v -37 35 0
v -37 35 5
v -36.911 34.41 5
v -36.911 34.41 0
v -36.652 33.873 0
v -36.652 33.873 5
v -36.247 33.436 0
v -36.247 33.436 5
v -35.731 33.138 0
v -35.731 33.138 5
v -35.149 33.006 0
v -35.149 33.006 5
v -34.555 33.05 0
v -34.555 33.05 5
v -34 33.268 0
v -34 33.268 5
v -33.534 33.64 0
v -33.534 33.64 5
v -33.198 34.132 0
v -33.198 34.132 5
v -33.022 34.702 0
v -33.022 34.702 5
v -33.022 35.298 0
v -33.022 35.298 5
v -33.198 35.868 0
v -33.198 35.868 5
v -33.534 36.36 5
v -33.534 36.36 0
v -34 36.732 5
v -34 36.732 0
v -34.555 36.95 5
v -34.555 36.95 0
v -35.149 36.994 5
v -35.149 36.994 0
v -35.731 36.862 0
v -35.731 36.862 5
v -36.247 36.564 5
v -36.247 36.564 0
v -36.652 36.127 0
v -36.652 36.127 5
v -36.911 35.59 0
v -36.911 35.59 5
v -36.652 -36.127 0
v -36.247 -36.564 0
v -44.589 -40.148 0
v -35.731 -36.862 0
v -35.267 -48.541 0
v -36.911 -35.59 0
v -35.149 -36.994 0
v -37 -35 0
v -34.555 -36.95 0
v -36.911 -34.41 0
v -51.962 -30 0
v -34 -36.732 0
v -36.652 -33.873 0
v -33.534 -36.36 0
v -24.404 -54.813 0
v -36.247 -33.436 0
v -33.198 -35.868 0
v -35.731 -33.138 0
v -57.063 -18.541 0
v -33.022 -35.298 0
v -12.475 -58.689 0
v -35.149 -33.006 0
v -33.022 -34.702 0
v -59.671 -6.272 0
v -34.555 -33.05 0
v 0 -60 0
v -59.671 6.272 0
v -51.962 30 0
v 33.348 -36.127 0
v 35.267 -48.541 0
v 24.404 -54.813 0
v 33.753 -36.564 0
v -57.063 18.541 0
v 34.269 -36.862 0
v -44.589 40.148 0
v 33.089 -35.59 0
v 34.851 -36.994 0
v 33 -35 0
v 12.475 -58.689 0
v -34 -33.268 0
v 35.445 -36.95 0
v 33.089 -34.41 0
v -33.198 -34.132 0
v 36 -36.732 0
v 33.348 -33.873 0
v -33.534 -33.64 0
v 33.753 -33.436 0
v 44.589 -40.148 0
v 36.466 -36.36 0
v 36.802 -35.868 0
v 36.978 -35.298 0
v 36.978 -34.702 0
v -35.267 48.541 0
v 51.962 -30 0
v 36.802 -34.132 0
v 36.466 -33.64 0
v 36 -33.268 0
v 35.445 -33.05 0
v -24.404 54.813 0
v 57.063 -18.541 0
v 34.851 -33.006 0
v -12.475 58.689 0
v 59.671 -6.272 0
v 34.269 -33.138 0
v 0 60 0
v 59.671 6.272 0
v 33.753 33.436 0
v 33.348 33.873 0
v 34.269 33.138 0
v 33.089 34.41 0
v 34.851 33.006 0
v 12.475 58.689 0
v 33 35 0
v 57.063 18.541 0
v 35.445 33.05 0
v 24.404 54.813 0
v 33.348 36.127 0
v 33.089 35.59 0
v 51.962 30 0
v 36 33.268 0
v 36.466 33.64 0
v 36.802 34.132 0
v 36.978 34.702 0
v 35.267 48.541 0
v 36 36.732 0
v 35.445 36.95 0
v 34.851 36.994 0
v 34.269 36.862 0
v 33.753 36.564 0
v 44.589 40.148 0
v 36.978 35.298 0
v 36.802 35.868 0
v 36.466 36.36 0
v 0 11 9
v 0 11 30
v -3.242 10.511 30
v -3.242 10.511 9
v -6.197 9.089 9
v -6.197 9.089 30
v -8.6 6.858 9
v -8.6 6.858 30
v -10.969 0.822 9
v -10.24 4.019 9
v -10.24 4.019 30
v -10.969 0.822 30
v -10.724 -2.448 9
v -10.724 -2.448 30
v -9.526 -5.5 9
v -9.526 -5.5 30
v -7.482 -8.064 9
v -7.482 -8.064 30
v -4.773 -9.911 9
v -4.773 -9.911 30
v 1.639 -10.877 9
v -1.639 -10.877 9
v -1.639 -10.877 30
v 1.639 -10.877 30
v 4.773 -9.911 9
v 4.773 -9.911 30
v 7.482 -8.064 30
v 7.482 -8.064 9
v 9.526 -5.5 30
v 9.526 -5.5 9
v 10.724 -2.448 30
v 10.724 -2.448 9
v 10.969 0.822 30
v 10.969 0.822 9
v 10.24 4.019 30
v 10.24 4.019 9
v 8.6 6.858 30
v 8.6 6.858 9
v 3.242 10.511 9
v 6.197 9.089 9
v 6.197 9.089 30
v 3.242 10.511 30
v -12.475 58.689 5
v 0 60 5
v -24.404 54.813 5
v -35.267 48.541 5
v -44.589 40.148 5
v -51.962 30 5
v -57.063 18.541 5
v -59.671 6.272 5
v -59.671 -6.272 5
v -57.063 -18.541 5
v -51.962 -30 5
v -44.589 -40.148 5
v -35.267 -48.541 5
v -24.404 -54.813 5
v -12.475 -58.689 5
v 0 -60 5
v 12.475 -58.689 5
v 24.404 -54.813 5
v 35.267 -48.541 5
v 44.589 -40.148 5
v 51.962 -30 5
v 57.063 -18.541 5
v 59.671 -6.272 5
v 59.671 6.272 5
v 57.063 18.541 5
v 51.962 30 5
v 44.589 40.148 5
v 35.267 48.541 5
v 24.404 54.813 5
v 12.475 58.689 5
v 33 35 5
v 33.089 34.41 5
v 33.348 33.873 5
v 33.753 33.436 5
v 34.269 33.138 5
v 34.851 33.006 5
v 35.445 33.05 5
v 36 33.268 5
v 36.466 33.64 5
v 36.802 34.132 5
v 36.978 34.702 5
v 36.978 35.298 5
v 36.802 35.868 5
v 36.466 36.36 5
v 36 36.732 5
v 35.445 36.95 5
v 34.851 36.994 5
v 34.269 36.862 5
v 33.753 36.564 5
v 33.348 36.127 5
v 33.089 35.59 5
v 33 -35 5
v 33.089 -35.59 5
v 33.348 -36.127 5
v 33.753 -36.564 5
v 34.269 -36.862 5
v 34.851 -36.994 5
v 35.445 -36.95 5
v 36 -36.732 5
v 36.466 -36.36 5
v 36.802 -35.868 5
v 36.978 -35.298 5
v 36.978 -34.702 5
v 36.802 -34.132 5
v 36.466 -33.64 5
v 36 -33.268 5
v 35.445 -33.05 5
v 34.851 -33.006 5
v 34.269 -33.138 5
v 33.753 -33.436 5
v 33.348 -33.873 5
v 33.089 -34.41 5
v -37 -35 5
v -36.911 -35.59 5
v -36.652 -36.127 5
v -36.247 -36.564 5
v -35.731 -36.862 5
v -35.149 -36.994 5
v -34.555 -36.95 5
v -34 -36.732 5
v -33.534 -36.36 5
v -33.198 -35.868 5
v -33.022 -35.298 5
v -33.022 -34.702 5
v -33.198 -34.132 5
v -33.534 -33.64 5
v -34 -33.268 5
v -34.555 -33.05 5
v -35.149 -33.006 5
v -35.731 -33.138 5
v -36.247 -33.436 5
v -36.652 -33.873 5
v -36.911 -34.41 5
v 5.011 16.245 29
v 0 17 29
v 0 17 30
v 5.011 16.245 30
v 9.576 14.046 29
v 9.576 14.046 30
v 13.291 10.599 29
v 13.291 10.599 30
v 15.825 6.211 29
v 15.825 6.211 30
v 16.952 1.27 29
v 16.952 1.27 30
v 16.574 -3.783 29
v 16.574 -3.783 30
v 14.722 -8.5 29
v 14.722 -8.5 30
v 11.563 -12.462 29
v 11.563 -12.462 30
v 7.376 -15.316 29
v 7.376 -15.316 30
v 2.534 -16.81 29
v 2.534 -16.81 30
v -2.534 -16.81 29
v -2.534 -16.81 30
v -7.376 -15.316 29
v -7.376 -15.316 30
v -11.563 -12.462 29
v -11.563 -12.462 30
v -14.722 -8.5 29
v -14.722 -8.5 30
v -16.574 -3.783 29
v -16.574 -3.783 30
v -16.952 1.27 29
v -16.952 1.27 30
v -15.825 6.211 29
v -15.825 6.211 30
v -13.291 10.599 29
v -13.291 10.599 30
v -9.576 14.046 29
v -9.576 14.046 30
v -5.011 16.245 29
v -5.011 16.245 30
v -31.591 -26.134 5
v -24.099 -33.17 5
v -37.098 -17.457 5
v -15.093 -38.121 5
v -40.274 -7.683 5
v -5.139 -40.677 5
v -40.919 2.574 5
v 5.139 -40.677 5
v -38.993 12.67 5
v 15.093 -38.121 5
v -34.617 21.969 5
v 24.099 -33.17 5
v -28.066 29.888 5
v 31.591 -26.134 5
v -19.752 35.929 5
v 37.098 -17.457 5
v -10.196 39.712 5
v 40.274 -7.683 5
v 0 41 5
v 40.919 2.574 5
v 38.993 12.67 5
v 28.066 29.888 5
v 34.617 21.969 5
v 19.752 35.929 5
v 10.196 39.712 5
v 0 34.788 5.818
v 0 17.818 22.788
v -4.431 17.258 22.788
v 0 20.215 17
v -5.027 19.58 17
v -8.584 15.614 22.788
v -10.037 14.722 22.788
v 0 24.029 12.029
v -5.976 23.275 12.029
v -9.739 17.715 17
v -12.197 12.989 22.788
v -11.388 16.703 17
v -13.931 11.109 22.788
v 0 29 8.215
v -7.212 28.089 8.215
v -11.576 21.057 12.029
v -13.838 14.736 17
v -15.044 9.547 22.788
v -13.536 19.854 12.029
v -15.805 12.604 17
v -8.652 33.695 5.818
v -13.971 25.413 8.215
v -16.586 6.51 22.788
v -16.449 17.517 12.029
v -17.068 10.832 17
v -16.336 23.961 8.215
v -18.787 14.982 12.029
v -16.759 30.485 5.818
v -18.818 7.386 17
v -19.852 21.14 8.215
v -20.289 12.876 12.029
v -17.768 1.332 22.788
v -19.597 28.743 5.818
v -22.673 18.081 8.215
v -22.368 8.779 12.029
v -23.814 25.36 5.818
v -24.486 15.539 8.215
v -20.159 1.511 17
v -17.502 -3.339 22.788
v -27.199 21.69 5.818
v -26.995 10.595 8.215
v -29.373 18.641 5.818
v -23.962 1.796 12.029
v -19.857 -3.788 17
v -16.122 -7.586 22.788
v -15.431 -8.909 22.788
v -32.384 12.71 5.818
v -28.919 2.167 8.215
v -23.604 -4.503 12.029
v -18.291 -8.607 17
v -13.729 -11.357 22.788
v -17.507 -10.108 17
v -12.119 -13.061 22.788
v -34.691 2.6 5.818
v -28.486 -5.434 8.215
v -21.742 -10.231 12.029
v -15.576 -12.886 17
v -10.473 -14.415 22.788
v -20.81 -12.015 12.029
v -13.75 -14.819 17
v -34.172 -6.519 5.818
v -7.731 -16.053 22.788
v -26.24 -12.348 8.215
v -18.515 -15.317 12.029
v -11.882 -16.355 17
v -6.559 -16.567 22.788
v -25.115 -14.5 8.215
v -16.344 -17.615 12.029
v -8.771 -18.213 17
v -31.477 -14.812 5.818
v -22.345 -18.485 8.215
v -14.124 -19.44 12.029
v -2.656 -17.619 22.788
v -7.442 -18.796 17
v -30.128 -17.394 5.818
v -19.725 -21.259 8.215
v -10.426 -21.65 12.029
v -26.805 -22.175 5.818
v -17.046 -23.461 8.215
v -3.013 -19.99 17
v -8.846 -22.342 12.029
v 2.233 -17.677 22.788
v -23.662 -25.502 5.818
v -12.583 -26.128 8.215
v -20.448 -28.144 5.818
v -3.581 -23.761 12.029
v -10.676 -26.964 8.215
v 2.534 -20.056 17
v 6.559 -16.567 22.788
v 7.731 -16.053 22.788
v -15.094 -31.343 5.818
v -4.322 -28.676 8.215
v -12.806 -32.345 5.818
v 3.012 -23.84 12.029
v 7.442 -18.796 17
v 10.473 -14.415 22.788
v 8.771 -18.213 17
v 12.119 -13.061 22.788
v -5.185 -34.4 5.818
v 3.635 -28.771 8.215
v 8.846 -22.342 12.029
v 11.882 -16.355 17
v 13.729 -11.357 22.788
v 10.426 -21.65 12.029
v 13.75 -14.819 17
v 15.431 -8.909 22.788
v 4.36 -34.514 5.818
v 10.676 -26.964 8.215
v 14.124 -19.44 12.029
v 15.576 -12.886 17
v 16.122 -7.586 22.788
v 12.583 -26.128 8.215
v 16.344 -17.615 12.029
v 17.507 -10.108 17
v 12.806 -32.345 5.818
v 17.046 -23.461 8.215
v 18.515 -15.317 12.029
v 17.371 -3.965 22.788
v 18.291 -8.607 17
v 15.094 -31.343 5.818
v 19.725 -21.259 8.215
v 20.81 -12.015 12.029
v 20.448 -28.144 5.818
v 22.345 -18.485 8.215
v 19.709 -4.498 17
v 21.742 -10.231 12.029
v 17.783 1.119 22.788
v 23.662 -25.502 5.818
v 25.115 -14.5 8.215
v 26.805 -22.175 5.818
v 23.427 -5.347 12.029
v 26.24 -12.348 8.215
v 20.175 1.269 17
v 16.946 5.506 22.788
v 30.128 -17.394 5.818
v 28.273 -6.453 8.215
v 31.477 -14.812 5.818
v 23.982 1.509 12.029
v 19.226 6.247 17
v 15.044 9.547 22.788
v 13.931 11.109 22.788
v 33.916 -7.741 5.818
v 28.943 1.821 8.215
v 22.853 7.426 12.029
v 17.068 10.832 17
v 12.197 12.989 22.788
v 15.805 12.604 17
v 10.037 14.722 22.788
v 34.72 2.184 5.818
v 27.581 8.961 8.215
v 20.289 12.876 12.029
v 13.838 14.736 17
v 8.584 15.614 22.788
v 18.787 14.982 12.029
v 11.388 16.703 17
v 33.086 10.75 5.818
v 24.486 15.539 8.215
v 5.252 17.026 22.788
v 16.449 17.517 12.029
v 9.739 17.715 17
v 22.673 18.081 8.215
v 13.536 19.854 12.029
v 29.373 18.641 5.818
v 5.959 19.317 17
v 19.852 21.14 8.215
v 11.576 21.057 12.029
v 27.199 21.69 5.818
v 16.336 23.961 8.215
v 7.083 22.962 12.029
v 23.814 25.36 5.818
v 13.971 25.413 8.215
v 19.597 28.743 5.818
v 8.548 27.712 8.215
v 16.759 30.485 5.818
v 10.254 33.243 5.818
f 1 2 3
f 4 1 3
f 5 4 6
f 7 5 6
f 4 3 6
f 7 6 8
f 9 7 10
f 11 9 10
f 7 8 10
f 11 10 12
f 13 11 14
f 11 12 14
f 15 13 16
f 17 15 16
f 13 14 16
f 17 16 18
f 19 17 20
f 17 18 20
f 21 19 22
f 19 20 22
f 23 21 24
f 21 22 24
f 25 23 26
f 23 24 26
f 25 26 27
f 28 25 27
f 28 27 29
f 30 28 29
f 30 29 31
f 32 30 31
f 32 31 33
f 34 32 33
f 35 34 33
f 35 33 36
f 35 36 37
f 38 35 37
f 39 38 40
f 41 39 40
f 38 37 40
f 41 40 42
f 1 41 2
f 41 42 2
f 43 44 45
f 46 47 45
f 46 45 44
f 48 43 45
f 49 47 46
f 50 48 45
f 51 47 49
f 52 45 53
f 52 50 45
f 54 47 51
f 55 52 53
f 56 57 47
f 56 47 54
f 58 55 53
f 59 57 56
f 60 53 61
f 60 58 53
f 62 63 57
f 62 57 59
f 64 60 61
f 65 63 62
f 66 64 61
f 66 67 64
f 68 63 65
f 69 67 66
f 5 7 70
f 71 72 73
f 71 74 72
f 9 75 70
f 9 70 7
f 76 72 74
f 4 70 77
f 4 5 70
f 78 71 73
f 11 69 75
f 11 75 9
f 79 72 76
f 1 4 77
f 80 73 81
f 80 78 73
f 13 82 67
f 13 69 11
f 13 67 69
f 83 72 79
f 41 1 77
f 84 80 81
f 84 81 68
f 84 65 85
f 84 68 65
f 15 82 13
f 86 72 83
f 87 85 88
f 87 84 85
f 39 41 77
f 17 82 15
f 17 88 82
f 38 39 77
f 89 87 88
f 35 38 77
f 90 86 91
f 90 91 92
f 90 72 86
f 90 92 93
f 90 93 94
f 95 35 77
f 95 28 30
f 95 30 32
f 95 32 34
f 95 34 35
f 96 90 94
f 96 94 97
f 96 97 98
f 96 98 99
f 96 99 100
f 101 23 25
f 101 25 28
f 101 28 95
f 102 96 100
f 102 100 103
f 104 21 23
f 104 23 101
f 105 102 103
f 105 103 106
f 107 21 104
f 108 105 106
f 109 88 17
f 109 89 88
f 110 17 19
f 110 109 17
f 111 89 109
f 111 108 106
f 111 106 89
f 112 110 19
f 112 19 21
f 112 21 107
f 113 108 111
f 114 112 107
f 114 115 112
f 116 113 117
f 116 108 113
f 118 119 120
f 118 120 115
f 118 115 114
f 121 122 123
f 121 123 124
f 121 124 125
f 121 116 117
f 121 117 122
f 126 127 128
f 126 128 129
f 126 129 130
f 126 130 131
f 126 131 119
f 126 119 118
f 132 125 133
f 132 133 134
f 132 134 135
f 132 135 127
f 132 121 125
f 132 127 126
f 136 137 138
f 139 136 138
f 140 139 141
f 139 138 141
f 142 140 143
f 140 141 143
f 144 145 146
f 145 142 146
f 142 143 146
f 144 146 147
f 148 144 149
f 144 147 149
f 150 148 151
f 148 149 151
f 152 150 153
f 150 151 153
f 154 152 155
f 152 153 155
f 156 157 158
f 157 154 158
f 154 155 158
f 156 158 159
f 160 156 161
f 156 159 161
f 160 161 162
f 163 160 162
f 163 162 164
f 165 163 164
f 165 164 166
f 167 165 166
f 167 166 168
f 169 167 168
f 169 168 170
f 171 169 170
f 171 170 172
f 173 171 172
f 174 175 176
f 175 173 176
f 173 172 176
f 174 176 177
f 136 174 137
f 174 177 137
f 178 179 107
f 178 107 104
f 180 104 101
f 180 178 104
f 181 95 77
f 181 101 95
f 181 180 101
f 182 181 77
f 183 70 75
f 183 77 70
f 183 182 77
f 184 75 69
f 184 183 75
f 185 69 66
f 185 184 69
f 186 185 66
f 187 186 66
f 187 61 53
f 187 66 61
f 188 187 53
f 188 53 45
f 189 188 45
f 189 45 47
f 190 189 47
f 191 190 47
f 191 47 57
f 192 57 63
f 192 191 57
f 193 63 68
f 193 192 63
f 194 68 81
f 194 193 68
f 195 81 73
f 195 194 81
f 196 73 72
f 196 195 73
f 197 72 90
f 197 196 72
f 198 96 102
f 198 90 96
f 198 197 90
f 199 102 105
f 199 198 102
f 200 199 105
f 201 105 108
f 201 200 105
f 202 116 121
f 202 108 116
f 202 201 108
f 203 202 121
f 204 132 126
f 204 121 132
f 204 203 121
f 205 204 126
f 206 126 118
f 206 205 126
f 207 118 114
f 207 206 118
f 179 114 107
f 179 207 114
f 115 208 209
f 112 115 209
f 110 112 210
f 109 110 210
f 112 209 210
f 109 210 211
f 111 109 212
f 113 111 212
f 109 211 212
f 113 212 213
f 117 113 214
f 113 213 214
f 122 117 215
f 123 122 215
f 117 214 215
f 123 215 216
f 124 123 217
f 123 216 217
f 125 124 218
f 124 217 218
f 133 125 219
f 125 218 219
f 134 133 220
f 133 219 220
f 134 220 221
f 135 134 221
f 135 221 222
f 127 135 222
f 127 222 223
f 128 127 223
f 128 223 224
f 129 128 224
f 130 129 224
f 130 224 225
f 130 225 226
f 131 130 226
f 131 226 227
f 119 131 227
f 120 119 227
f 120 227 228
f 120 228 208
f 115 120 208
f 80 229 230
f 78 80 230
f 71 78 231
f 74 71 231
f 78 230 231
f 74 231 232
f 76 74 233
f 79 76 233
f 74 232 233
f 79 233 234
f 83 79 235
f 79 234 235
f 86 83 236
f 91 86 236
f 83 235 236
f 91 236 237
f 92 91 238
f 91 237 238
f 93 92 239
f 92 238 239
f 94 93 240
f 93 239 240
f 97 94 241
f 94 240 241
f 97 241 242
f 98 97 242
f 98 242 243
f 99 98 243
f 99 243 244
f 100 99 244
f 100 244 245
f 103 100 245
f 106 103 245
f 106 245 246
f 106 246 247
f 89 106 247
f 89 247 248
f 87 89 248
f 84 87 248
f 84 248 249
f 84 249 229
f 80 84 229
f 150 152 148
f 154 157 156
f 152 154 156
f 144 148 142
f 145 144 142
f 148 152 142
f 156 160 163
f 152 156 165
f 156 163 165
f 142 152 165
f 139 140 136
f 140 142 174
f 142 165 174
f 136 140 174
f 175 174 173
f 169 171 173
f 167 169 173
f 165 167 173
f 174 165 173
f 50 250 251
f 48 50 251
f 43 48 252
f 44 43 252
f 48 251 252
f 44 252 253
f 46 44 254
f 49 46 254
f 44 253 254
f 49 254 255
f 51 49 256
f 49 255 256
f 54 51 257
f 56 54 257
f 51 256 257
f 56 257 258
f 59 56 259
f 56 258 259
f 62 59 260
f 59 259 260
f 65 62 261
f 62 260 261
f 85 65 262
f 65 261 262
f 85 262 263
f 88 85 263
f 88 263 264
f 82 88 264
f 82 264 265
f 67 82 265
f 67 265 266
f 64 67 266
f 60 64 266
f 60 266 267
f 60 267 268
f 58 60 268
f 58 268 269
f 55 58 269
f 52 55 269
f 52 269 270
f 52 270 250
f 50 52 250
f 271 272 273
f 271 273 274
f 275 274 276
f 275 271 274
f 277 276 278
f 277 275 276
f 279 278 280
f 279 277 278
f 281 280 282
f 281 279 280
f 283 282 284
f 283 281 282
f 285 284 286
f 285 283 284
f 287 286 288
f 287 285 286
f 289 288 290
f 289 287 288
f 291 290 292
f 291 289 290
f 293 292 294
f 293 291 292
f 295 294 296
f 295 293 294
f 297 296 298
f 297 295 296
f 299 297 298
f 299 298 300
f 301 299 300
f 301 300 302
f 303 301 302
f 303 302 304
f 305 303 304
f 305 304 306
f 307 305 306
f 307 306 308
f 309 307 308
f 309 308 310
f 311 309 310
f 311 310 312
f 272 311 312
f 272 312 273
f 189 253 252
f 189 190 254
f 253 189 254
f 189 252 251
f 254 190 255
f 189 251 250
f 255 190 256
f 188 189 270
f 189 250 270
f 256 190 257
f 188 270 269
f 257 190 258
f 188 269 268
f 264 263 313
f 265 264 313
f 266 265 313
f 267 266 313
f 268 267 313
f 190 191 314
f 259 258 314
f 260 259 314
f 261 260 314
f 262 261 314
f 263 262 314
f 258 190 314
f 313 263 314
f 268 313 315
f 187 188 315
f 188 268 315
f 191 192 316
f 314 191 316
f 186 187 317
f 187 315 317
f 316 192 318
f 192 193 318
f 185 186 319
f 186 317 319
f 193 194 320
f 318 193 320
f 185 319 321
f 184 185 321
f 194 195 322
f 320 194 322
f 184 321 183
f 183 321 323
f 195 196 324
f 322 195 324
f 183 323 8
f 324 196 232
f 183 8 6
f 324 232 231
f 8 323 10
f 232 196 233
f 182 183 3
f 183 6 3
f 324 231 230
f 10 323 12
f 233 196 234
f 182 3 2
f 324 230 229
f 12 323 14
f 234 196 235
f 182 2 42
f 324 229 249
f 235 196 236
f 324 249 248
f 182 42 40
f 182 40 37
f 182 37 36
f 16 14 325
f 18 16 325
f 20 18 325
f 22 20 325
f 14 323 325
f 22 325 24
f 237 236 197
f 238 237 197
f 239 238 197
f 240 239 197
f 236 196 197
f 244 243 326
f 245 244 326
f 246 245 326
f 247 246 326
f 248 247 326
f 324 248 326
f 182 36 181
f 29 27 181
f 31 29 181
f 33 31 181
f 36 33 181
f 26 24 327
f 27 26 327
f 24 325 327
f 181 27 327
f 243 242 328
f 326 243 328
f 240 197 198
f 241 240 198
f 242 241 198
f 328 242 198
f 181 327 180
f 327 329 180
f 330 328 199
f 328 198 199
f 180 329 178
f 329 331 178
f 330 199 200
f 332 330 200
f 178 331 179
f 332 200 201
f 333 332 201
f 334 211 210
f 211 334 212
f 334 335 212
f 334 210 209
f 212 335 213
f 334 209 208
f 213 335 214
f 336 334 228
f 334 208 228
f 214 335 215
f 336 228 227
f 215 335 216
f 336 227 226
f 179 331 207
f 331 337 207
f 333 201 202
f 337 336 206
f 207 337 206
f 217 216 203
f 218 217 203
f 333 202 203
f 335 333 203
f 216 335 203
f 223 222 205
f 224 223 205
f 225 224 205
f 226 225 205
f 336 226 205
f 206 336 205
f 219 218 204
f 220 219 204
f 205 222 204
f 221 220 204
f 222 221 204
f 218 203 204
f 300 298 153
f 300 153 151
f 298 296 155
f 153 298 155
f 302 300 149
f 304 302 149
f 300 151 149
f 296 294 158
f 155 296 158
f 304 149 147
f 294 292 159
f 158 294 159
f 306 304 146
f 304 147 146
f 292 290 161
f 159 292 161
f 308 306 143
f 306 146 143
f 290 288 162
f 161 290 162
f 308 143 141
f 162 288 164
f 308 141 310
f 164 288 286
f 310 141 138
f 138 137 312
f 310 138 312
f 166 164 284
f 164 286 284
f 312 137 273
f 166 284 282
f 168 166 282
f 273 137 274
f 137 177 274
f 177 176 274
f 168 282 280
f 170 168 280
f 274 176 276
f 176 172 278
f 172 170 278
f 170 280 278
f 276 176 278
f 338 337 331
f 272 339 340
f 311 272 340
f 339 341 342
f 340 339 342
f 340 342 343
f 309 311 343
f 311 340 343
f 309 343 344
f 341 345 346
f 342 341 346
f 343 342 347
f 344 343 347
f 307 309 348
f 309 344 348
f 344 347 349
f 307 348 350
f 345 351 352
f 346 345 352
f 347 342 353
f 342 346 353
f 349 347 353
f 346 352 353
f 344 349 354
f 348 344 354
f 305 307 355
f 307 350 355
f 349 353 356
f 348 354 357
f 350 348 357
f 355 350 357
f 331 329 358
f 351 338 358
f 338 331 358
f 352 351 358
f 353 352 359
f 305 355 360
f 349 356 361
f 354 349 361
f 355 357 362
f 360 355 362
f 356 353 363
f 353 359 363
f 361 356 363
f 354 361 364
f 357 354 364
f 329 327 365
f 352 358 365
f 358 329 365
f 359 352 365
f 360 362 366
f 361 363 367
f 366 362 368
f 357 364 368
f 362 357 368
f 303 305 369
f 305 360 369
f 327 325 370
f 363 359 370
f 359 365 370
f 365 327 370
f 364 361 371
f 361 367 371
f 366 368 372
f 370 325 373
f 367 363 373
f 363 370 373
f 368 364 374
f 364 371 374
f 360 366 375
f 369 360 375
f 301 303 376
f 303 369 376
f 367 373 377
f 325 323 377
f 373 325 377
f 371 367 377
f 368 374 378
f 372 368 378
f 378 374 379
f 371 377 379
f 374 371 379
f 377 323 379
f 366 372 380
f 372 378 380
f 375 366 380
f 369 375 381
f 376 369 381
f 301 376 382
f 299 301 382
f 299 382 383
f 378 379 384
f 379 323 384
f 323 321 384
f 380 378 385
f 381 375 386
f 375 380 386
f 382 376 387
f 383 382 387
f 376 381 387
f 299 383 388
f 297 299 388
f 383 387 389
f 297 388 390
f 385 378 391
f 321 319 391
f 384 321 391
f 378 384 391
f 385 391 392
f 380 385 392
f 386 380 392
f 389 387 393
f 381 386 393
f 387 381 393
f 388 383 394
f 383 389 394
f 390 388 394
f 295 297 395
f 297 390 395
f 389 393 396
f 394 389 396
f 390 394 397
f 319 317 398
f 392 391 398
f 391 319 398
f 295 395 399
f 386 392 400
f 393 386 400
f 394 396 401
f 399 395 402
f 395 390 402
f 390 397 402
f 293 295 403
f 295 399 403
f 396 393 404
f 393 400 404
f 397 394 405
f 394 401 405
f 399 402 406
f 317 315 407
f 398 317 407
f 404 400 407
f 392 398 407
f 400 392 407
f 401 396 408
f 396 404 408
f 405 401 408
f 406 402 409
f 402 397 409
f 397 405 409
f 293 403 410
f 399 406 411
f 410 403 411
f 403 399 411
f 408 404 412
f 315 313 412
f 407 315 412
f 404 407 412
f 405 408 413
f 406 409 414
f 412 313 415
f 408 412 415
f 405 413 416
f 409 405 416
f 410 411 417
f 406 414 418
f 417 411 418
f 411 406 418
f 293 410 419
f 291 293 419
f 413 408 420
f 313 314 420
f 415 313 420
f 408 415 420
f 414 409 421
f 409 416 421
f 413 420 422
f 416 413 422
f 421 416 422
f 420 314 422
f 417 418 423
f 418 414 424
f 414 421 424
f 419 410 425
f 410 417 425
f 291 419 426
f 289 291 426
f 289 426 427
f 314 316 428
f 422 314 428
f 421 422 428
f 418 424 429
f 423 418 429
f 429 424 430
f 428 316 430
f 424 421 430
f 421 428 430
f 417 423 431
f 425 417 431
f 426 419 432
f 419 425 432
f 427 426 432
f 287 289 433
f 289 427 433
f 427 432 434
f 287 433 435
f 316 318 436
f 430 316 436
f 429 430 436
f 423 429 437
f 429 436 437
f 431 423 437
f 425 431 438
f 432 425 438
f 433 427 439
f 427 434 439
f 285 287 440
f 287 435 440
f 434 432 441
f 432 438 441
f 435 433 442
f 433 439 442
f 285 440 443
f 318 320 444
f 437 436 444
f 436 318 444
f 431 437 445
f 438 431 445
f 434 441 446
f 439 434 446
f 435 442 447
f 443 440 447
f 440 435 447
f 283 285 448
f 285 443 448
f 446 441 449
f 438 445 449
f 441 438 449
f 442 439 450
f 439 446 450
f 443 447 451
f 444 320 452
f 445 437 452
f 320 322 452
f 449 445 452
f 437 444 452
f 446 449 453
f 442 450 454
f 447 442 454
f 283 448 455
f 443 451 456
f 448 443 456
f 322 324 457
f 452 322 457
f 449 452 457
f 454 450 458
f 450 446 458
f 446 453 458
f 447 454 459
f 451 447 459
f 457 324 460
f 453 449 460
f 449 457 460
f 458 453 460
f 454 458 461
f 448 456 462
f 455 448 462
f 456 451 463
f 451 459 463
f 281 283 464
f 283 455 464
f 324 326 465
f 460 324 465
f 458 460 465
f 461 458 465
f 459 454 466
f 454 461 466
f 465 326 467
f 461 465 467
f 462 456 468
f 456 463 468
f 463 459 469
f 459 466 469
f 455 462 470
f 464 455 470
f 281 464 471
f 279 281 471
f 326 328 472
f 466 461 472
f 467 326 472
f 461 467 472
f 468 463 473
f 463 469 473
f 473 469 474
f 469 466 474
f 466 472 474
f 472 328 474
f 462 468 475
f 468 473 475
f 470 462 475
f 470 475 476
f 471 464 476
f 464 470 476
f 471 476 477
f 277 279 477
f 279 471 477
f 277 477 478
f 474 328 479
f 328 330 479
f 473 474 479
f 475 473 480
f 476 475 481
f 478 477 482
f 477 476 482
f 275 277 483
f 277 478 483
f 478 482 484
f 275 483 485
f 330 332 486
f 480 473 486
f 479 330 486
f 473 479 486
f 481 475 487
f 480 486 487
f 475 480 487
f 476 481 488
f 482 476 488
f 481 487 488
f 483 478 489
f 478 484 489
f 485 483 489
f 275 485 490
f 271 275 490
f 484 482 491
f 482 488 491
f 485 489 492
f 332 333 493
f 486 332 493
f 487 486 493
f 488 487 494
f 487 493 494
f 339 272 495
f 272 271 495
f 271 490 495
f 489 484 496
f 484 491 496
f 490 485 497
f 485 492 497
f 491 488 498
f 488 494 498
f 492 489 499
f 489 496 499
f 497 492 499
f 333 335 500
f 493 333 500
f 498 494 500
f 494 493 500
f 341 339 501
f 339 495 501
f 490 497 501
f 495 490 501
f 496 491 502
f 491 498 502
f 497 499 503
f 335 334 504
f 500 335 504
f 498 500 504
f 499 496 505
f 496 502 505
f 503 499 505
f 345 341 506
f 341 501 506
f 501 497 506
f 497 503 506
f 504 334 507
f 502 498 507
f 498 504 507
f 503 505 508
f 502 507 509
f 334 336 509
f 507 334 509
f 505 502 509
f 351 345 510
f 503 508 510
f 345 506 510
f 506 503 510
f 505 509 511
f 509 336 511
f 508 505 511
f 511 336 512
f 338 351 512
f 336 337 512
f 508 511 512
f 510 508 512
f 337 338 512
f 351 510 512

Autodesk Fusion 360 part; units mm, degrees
sketch "Sketch1" plane through (0, 0, 0) normal (1, 0, 0) x (0, 1, 0)
  line L0 (0, 0) -> (11, 0) construction
  line L1 (0, 0) -> (60, 0)
  line L2 (60, 0) -> (60, 5)
  line L3 (60, 5) -> (41, 5) construction
  line L4 (0, 5) -> (0, 0) construction
  line L5 (0, 0) -> (0, 9)
  line L6 (11, 0) -> (11, 30) construction
  line L7 (0, 9) -> (11, 9)
  line L8 (11, 9) -> (11, 30)
  line L9 (11, 30) -> (17, 30)
  line L10 (17, 30) -> (17, 29)
  arc A0 (17, 29) -> (41, 5) centre (41, 29) ccw
  line L11 (41, 5) -> (60, 5)
  dimension "d1" = 11
  dimension "d2" = 60
  dimension "d3" = 5
  dimension "d4" = 9
  dimension "d5" = 30
  dimension "d6" = 6
  dimension "d7" = 24
revolve "Revolve1" add sketch "Sketch1" angle 360 about axis through (0, 0, 5) along (0, 0, -1)
sketch "Sketch2" plane through (0, 0, 5) normal (0, 0, 1) x (-1, 0, 0)
  circle A0 centre (0, 0) radius 41
  circle A1 centre (0, 0) radius 60
  line L0 (0, 0) -> (0, 35) construction
  line L1 (0, 0) -> (-35, 0) construction
  line L2 (-35, 0) -> (-35, 35) construction
  line L3 (-35, 35) -> (0, 35) construction
  circle A2 centre (-35, 35) radius 2
  circle A3 centre (-35, -35) radius 2
  circle A4 centre (35, -35) radius 2
  circle A5 centre (35, 35) radius 2
  dimension "d9" = 35
  dimension "d10" = 35
  dimension "d11" = 4
  dimension "d13" = 360
extrude "Extrude2" cut sketch "Sketch2" against normal blind 6 contours A2 | A3 | A4 | A5
